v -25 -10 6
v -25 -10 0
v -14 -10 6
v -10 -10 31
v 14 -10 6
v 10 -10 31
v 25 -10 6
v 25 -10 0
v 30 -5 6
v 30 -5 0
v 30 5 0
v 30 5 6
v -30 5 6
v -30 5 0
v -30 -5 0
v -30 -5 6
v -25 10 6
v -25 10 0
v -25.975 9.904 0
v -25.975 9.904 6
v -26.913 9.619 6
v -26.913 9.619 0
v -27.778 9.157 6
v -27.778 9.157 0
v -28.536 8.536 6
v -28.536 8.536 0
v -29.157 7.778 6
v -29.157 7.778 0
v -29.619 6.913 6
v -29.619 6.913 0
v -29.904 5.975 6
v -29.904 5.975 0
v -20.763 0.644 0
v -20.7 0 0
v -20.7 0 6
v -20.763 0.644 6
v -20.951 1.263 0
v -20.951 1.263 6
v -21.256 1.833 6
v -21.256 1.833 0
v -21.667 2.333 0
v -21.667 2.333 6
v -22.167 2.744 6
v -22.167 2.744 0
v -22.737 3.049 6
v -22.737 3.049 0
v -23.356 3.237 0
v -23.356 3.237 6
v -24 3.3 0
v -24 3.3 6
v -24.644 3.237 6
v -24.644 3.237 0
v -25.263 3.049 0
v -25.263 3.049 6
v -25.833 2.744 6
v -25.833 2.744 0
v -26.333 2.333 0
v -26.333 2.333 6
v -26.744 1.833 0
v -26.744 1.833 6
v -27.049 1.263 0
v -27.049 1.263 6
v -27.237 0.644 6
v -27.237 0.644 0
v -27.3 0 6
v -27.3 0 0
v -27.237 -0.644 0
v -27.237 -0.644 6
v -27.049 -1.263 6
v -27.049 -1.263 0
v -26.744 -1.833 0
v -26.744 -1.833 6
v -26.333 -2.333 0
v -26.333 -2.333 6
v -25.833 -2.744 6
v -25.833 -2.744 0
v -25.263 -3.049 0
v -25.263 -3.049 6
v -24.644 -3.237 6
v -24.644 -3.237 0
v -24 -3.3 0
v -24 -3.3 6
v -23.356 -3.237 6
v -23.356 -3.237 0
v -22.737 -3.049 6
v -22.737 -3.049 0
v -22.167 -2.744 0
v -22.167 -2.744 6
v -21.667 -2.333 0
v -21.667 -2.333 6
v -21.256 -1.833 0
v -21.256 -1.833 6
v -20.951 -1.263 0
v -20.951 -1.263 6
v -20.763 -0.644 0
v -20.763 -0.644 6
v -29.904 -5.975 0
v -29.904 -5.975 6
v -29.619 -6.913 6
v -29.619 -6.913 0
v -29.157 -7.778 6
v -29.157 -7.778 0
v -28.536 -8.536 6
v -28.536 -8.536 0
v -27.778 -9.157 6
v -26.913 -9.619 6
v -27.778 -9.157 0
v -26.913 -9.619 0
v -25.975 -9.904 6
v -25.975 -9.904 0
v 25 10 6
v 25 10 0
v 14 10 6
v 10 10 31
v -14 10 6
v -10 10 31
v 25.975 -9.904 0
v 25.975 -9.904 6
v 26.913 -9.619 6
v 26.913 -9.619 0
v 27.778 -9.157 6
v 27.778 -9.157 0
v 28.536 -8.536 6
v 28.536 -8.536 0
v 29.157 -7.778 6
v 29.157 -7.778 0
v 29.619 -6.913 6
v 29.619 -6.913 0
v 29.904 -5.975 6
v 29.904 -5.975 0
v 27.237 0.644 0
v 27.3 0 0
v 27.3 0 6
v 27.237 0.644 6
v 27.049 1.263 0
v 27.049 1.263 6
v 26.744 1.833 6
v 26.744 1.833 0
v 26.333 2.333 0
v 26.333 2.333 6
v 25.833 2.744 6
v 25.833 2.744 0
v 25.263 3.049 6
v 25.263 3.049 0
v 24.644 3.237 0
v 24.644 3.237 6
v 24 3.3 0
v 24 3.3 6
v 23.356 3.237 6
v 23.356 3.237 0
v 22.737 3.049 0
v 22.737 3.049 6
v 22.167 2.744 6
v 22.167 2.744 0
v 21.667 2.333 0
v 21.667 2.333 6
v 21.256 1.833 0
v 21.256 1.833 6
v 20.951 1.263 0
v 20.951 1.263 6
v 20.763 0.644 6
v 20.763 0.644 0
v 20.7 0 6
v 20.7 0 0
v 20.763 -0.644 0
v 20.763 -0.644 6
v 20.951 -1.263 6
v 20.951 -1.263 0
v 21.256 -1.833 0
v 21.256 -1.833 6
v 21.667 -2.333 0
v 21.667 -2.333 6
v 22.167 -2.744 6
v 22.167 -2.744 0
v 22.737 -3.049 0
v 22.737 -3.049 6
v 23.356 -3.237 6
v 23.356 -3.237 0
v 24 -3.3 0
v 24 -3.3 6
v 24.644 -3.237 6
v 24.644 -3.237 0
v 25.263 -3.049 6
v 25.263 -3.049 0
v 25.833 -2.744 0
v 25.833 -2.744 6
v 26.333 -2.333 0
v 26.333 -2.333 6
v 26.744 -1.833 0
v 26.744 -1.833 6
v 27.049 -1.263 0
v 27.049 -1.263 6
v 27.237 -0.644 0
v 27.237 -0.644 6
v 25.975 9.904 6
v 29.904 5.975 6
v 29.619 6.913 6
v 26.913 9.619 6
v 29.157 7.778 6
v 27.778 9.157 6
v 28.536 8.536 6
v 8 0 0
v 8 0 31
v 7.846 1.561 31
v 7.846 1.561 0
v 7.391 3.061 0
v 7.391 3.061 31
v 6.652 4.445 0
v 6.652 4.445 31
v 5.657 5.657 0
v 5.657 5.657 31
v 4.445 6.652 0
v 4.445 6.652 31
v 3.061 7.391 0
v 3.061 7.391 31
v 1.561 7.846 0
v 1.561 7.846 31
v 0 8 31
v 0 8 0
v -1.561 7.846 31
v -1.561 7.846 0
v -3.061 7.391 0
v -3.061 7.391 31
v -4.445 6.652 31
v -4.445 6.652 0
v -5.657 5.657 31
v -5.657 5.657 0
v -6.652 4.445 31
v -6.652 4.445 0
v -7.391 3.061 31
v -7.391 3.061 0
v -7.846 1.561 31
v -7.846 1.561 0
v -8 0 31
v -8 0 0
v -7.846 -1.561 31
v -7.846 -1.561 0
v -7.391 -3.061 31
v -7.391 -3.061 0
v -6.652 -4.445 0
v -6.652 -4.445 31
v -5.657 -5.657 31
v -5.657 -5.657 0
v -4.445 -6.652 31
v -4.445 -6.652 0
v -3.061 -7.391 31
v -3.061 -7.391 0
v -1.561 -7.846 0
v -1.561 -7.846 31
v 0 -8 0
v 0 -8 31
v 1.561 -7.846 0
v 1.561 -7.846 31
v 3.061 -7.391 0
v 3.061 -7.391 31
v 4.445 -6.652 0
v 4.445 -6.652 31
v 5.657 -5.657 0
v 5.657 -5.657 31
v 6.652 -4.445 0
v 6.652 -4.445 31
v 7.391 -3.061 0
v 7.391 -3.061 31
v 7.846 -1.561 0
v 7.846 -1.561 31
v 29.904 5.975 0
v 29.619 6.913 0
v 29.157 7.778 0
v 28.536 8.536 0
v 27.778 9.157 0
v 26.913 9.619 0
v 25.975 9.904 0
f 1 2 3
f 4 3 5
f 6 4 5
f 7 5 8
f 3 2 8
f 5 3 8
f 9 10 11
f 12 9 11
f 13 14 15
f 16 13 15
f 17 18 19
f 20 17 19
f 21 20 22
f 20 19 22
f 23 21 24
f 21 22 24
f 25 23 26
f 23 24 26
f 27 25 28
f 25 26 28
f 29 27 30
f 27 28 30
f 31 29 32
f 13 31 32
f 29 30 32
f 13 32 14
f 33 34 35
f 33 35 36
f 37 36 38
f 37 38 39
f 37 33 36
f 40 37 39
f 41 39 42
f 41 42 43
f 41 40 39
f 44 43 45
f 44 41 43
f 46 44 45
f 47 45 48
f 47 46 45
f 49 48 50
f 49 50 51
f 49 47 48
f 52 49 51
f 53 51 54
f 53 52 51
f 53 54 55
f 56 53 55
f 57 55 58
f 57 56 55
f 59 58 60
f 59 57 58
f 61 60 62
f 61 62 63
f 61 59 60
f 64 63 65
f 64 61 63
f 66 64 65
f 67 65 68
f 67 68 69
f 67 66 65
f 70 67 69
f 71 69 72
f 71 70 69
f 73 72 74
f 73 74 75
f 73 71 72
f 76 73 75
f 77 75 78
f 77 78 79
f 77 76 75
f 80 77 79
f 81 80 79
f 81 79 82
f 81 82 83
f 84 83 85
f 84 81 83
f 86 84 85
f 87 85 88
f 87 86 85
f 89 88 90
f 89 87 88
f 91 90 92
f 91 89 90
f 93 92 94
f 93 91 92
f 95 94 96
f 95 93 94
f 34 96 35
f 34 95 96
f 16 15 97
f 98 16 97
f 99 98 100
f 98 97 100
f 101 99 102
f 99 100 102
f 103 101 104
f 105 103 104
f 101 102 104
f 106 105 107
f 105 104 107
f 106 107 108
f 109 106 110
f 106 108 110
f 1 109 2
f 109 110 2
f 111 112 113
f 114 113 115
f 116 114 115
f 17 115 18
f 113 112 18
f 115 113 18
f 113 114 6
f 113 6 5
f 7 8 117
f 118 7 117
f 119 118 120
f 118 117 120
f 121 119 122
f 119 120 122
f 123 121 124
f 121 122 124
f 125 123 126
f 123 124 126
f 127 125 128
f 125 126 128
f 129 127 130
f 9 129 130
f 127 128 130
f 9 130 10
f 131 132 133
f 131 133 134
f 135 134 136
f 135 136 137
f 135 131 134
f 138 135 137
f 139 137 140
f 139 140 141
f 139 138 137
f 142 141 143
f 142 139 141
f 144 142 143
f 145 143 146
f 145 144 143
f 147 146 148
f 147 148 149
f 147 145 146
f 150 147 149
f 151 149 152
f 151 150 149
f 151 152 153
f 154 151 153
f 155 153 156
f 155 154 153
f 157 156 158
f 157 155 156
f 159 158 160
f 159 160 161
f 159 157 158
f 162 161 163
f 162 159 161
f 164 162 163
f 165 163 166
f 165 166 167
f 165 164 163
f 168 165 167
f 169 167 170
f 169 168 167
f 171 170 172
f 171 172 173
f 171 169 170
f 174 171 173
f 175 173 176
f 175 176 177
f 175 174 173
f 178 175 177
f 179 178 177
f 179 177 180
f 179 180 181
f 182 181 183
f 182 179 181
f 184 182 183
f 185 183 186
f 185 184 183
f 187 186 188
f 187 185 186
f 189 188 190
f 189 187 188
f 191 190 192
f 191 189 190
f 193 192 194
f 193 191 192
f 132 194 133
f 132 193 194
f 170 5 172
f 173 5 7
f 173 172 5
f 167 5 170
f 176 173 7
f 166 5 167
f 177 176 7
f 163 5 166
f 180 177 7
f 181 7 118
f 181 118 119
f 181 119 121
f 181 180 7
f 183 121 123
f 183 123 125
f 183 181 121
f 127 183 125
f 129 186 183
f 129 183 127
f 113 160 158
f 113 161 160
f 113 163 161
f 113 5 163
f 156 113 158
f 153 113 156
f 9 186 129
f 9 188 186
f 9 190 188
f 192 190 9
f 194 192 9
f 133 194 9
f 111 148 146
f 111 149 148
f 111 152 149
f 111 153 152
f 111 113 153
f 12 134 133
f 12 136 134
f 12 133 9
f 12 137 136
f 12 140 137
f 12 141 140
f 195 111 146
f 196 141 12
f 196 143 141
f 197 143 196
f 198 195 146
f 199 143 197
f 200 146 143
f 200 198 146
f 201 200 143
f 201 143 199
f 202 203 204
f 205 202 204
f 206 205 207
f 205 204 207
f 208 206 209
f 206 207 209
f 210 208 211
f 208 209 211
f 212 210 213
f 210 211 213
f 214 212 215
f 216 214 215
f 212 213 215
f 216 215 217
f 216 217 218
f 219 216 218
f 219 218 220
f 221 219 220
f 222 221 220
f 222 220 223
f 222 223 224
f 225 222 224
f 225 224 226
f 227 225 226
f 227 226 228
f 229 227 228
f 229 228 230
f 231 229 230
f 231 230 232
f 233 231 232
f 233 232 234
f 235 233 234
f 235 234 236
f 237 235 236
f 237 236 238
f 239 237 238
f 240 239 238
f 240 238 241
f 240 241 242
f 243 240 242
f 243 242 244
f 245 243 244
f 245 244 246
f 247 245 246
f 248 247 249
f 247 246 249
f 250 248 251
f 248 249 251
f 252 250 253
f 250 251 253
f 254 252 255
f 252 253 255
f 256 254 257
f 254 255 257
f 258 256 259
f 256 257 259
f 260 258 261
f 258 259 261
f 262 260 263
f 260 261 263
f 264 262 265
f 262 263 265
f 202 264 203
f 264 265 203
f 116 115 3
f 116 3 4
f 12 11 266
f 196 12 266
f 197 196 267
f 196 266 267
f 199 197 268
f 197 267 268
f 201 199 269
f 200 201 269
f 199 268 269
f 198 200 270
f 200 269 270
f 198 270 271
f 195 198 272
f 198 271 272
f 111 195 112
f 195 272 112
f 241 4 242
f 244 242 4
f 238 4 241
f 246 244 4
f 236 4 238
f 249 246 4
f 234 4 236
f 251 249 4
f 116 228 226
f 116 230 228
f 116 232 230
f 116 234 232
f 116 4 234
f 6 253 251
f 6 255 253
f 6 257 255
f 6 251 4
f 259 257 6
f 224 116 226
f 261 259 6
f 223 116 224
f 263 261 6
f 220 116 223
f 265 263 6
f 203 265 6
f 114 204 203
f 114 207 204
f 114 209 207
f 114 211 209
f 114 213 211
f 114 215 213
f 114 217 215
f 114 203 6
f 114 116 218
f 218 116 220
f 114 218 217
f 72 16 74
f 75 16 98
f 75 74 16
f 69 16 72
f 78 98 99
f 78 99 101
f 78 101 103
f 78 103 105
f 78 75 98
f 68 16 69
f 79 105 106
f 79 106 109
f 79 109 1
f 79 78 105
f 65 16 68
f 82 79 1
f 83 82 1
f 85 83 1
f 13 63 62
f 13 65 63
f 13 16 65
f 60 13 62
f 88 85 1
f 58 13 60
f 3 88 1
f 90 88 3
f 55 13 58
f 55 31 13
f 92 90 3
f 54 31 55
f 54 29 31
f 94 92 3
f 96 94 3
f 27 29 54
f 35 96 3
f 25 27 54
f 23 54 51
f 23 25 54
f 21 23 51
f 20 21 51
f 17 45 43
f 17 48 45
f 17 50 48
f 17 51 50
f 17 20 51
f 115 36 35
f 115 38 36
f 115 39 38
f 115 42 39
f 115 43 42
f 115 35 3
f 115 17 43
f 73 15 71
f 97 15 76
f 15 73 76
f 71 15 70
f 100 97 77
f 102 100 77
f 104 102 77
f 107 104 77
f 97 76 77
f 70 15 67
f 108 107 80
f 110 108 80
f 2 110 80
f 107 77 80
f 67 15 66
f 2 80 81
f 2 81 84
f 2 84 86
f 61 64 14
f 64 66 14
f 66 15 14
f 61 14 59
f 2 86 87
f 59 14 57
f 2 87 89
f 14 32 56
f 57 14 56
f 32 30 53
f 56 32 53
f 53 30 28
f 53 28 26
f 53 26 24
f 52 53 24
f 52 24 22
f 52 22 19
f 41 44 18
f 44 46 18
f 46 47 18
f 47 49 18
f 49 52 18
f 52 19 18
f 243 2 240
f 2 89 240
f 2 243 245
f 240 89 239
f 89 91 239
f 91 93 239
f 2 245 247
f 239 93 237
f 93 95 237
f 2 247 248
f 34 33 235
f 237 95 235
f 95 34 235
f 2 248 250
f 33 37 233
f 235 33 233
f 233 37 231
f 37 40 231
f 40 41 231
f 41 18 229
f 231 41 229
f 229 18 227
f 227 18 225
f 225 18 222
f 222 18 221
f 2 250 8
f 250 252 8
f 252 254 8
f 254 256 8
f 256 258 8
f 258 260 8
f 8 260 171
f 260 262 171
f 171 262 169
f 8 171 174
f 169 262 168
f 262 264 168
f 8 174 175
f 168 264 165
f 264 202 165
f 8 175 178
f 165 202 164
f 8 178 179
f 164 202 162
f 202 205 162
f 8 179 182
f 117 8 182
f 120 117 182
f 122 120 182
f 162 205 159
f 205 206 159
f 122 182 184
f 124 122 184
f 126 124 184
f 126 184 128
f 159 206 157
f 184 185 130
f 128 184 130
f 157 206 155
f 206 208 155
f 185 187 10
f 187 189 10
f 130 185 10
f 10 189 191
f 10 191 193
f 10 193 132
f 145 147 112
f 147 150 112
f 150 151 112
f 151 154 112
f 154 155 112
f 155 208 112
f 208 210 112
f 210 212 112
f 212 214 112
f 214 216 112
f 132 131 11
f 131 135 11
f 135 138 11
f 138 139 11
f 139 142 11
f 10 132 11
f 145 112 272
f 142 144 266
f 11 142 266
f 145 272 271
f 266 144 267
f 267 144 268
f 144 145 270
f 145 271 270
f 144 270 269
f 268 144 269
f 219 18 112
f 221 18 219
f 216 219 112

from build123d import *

# Parameters (mm, degrees)
SKETCH_1_R          = 3.3
EXTRUDE_1_DEPTH     = 6
EXTRUDE_3_DEPTH     = 20
SKETCH_3_R          = 8
CUT_EXTRUDE_1_DEPTH = 32


with BuildPart() as part:
    # 草图1 → 凸台-拉伸1 (new body)
    with BuildSketch(Plane.XY):
        with BuildLine():
            Line((25, 10), (-25, 10))
            ThreePointArc((-25, 10), (-28.535533906, 8.535533906), (-30, 5))
            Line((-30, 5), (-30, -5))
            ThreePointArc((-30, -5), (-28.535533906, -8.535533906), (-25, -10))
            Line((-25, -10), (25, -10))
            ThreePointArc((25, -10), (28.535533906, -8.535533906), (30, -5))
            Line((30, -5), (30, 5))
            ThreePointArc((30, 5), (28.535533906, 8.535533906), (25, 10))
        make_face()
        with Locations((-24, 0)):
            Circle(SKETCH_1_R, mode=Mode.SUBTRACT)
        with Locations((24, 0)):
            Circle(SKETCH_1_R, mode=Mode.SUBTRACT)
    extrude(amount=EXTRUDE_1_DEPTH)

    # 草图2 → 凸台-拉伸3 (add)
    with BuildSketch(Plane(origin=(0, 10, 0), x_dir=(1, 0, 0), z_dir=(0, 1, 0))):
        Polygon((14, -6), (-14, -6), (-10, -31), (10, -31), align=None)
    extrude(amount=-EXTRUDE_3_DEPTH)

    # 草图3 → 切除-拉伸1 (cut, through all)
    with BuildSketch(Plane.XY.offset(31)):
        Circle(SKETCH_3_R)
    extrude(amount=-CUT_EXTRUDE_1_DEPTH, mode=Mode.SUBTRACT)


solid = part.part
